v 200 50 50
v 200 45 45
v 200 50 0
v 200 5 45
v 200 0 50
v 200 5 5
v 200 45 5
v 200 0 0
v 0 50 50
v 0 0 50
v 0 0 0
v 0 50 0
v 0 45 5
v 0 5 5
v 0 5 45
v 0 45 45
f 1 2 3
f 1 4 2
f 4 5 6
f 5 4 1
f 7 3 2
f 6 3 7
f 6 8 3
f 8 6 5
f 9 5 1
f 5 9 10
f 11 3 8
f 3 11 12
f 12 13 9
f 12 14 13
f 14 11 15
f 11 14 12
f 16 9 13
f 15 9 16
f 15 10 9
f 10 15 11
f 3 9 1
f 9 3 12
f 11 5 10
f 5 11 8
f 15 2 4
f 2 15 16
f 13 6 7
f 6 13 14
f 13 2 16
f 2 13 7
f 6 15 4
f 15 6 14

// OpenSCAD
$fn = 32;

// ----------------------------------------------------------------------
// Box beam: 200-250 mm hollow beam
// ----------------------------------------------------------------------

// --- parameters (mm) ---
beam_l = 200;             // beam length, X
beam_w = 50;              // beam width, Y
beam_h = 50;              // beam height, Z
wall = 5;                 // wall thickness

difference() {
  cube([beam_l, beam_w, beam_h]);
  translate([-1, wall, wall])
    cube([beam_l + 2, beam_w - 2 * wall, beam_h - 2 * wall]);
}
